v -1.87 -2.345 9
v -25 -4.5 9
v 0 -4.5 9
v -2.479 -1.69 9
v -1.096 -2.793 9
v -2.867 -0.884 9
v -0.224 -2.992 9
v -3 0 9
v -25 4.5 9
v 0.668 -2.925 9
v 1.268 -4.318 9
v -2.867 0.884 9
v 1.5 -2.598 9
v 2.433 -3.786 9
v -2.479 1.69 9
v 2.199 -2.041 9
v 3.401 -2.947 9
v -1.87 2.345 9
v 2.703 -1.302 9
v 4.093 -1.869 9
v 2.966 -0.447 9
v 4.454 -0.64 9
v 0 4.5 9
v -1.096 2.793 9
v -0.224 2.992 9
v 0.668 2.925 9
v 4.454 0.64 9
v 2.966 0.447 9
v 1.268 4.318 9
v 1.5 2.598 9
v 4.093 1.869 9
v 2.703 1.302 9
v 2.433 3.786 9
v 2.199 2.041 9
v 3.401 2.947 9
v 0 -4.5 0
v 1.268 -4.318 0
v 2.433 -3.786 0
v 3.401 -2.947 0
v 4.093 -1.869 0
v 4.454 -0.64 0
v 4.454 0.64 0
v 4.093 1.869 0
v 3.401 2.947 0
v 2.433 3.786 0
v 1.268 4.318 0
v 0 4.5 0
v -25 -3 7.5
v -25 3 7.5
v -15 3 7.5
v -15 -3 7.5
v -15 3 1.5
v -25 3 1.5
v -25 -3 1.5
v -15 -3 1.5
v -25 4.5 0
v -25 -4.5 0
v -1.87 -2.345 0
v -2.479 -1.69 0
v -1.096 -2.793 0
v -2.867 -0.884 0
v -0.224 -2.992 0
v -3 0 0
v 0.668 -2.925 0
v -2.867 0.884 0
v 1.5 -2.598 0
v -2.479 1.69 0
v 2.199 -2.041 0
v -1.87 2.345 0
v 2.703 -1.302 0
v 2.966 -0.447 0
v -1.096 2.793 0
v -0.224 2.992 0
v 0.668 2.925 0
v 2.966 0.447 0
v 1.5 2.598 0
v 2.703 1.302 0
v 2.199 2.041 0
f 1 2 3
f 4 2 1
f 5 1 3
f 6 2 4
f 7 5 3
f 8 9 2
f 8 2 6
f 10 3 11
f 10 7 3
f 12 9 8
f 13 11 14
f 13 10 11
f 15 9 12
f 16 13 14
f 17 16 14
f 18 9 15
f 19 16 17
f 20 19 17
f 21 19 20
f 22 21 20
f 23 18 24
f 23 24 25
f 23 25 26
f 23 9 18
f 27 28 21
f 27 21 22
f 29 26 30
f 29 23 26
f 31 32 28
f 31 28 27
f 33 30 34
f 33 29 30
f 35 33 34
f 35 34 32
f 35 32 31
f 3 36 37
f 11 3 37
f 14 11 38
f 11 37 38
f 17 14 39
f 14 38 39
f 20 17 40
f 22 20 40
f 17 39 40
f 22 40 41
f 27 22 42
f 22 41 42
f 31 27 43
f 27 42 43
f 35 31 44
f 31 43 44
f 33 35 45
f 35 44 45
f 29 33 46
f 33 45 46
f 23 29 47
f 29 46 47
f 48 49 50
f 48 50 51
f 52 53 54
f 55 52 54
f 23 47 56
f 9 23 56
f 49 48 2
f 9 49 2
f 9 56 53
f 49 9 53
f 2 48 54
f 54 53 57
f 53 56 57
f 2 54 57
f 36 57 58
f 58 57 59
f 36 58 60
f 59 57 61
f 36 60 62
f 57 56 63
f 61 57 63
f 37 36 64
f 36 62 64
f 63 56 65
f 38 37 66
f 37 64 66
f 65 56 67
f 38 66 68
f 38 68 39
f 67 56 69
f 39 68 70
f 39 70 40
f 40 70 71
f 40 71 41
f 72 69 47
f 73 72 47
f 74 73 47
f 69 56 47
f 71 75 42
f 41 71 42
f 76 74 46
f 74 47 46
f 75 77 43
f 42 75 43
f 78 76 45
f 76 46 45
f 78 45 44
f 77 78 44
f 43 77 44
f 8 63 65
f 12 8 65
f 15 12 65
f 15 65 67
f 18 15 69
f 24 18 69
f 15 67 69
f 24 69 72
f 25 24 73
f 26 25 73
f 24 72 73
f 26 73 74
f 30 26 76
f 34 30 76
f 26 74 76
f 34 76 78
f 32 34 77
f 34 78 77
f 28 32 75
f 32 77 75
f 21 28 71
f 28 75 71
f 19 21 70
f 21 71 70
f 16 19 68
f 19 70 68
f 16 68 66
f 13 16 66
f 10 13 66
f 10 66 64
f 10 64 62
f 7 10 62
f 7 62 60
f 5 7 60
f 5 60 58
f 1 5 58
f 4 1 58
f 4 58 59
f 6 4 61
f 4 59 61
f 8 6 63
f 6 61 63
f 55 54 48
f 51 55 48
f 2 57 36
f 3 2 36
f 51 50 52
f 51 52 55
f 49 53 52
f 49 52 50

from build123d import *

# Parameters (mm, degrees)
F1_DEPTH = 9
F2_W     = 6
F2_H     = 6
F3_DEPTH = 10


# Not quite as in the source:
# - a feature names something its author has since deleted; it is built from what else it names


with BuildPart() as f1:
    # F0 (on Top) → F1 (new body)
    with BuildSketch(Plane.XY):
        with BuildLine():
            Line((-25, -4.5), (0, -4.5))
            ThreePointArc((0, -4.5), (4.5, 0), (0, 4.5))
            Line((0, 4.5), (-25, 4.5))
            Line((-25, 4.5), (-25, 0))
            Line((-25, 0), (-25, -4.5))
        make_face()
        with BuildLine():
            ThreePointArc((3, 0), (0, -3), (-3, 0))
            ThreePointArc((-3, 0), (0, 3), (3, 0))
        make_face(mode=Mode.SUBTRACT)
    extrude(amount=F1_DEPTH)

    # F2 (on face) → F3 (cut)
    with BuildSketch(Plane(origin=(-25, 0, 0), x_dir=(0, -1, 0), z_dir=(-1, 0, 0))):
        with Locations((0, 4.5)):
            Rectangle(F2_W, F2_H)
    extrude(amount=-F3_DEPTH, mode=Mode.SUBTRACT)


solid = f1.part
